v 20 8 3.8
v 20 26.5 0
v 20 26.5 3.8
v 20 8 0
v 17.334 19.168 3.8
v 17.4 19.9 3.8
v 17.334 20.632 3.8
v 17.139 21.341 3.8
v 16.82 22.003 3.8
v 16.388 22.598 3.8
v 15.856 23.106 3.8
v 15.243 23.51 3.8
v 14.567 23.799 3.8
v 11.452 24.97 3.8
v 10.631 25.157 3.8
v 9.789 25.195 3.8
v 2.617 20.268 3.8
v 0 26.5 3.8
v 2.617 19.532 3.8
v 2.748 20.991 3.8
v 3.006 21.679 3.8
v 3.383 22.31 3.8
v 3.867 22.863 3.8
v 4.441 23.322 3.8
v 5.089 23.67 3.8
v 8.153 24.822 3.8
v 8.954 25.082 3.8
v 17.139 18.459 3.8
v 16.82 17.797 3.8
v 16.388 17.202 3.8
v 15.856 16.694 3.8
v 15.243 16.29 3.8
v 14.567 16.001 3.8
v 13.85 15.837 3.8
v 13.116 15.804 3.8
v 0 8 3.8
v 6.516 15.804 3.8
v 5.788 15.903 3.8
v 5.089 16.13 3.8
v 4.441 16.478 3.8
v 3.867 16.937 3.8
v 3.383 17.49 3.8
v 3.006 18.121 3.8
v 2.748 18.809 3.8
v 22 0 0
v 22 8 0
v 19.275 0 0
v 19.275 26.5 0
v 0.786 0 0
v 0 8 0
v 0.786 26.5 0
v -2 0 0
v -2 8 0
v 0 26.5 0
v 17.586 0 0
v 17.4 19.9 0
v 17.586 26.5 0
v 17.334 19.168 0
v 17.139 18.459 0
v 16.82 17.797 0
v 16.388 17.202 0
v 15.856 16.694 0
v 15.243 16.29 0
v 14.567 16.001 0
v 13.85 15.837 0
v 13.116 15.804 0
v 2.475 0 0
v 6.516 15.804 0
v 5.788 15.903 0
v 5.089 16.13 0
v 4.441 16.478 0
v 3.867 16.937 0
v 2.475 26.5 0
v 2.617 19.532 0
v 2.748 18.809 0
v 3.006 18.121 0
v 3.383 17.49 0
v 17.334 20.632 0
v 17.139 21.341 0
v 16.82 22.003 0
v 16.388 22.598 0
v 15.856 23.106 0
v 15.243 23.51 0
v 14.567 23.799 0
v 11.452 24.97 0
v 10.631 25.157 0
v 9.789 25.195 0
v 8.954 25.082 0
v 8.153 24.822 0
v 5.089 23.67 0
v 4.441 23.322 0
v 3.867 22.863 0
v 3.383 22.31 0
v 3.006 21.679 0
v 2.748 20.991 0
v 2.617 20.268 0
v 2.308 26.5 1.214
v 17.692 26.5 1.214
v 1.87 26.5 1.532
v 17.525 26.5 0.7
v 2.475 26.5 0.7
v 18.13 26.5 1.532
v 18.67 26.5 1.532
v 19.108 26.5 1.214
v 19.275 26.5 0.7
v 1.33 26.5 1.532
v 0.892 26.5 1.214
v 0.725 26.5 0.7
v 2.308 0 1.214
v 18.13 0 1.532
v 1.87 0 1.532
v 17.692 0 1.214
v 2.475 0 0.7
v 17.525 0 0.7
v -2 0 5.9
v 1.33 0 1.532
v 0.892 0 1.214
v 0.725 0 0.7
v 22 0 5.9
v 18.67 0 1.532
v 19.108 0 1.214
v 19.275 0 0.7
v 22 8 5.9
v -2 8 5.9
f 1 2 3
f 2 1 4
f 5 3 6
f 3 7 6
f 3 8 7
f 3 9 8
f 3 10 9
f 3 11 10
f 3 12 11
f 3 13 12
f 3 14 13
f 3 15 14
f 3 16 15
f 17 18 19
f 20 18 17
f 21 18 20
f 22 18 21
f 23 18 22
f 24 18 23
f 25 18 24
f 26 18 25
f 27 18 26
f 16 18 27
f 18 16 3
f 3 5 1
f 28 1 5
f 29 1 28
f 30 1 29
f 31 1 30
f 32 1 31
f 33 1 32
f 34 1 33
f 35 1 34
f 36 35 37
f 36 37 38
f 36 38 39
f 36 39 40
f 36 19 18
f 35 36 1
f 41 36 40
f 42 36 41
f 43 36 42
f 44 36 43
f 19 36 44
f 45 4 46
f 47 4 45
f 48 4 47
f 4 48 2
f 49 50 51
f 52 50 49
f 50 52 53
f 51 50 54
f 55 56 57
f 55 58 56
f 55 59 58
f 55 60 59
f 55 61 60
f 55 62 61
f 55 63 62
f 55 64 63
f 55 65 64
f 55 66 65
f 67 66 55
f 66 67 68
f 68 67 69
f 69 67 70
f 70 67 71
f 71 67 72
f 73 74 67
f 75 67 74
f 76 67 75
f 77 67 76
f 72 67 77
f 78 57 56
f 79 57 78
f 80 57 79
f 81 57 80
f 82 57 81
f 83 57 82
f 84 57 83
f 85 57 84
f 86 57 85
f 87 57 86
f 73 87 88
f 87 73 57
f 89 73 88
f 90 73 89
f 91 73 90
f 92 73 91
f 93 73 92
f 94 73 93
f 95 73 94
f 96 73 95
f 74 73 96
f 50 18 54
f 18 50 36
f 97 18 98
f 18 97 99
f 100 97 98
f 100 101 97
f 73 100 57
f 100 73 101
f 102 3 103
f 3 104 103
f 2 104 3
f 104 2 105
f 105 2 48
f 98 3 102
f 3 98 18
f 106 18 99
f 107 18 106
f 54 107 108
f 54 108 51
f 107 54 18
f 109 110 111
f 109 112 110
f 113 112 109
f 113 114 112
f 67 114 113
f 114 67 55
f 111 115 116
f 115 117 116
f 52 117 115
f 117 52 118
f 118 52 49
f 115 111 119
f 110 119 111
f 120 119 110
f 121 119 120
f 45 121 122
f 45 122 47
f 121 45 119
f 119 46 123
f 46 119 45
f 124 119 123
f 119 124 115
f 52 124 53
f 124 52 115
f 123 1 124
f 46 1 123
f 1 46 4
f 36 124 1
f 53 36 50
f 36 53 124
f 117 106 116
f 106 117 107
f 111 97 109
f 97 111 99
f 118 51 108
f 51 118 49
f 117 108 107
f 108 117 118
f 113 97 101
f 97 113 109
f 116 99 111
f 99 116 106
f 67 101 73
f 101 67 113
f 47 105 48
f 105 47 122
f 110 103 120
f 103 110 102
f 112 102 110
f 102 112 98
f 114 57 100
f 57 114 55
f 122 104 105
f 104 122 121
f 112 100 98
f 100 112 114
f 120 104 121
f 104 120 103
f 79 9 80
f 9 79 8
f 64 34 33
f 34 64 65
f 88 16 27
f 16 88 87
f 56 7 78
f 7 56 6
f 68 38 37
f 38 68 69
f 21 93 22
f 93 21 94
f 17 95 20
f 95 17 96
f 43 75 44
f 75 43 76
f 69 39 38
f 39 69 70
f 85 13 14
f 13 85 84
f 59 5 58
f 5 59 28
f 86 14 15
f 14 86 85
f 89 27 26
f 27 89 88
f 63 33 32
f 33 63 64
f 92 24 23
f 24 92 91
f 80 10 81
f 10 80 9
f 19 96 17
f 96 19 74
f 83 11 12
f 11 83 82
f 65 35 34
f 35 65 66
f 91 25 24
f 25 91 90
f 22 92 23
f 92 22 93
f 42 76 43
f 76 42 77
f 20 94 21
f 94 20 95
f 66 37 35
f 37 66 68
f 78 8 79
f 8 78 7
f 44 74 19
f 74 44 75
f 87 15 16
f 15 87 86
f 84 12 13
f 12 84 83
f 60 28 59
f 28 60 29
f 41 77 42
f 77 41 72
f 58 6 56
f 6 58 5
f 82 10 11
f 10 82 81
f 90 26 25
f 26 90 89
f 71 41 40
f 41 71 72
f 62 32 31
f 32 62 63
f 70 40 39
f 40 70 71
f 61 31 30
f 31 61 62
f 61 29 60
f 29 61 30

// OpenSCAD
difference() {
	// The outer part
	union() {
		cube([20, 26.5, 3.8]);
		translate([-2, 0, 0])
			cube([24, 8, 5.9]);
	}

	// Mounting hole for the door
	hull() {
		translate([6.7, 19.9, 0])
			cylinder(r=4.1, h=3.8, $fn=35);
		translate([13.3, 19.9, 0])
			cylinder(r=4.1, h=3.8, $fn=35);
		translate([10, 20.5, 0])
			cylinder(r=4.7, h=3.8, $fn=35);
	}

	// Holes for running the wires
	rotate([270, 0, 0]) {
		hull() {
			translate([1.6, -0.7, -0.1])
				cylinder(h=26.7, r=0.875, $fn=10);
			translate([1.6, 0.7, -0.1])
				cylinder(h=26.7, r=0.875);
		}
		hull() {
			translate([18.4, -0.7, -0.1])
				cylinder(h=26.7, r=0.875, $fn=10);
			translate([18.4, 0.7, -0.1])
				cylinder(h=26.7, r=0.875);
		}
	}
}
